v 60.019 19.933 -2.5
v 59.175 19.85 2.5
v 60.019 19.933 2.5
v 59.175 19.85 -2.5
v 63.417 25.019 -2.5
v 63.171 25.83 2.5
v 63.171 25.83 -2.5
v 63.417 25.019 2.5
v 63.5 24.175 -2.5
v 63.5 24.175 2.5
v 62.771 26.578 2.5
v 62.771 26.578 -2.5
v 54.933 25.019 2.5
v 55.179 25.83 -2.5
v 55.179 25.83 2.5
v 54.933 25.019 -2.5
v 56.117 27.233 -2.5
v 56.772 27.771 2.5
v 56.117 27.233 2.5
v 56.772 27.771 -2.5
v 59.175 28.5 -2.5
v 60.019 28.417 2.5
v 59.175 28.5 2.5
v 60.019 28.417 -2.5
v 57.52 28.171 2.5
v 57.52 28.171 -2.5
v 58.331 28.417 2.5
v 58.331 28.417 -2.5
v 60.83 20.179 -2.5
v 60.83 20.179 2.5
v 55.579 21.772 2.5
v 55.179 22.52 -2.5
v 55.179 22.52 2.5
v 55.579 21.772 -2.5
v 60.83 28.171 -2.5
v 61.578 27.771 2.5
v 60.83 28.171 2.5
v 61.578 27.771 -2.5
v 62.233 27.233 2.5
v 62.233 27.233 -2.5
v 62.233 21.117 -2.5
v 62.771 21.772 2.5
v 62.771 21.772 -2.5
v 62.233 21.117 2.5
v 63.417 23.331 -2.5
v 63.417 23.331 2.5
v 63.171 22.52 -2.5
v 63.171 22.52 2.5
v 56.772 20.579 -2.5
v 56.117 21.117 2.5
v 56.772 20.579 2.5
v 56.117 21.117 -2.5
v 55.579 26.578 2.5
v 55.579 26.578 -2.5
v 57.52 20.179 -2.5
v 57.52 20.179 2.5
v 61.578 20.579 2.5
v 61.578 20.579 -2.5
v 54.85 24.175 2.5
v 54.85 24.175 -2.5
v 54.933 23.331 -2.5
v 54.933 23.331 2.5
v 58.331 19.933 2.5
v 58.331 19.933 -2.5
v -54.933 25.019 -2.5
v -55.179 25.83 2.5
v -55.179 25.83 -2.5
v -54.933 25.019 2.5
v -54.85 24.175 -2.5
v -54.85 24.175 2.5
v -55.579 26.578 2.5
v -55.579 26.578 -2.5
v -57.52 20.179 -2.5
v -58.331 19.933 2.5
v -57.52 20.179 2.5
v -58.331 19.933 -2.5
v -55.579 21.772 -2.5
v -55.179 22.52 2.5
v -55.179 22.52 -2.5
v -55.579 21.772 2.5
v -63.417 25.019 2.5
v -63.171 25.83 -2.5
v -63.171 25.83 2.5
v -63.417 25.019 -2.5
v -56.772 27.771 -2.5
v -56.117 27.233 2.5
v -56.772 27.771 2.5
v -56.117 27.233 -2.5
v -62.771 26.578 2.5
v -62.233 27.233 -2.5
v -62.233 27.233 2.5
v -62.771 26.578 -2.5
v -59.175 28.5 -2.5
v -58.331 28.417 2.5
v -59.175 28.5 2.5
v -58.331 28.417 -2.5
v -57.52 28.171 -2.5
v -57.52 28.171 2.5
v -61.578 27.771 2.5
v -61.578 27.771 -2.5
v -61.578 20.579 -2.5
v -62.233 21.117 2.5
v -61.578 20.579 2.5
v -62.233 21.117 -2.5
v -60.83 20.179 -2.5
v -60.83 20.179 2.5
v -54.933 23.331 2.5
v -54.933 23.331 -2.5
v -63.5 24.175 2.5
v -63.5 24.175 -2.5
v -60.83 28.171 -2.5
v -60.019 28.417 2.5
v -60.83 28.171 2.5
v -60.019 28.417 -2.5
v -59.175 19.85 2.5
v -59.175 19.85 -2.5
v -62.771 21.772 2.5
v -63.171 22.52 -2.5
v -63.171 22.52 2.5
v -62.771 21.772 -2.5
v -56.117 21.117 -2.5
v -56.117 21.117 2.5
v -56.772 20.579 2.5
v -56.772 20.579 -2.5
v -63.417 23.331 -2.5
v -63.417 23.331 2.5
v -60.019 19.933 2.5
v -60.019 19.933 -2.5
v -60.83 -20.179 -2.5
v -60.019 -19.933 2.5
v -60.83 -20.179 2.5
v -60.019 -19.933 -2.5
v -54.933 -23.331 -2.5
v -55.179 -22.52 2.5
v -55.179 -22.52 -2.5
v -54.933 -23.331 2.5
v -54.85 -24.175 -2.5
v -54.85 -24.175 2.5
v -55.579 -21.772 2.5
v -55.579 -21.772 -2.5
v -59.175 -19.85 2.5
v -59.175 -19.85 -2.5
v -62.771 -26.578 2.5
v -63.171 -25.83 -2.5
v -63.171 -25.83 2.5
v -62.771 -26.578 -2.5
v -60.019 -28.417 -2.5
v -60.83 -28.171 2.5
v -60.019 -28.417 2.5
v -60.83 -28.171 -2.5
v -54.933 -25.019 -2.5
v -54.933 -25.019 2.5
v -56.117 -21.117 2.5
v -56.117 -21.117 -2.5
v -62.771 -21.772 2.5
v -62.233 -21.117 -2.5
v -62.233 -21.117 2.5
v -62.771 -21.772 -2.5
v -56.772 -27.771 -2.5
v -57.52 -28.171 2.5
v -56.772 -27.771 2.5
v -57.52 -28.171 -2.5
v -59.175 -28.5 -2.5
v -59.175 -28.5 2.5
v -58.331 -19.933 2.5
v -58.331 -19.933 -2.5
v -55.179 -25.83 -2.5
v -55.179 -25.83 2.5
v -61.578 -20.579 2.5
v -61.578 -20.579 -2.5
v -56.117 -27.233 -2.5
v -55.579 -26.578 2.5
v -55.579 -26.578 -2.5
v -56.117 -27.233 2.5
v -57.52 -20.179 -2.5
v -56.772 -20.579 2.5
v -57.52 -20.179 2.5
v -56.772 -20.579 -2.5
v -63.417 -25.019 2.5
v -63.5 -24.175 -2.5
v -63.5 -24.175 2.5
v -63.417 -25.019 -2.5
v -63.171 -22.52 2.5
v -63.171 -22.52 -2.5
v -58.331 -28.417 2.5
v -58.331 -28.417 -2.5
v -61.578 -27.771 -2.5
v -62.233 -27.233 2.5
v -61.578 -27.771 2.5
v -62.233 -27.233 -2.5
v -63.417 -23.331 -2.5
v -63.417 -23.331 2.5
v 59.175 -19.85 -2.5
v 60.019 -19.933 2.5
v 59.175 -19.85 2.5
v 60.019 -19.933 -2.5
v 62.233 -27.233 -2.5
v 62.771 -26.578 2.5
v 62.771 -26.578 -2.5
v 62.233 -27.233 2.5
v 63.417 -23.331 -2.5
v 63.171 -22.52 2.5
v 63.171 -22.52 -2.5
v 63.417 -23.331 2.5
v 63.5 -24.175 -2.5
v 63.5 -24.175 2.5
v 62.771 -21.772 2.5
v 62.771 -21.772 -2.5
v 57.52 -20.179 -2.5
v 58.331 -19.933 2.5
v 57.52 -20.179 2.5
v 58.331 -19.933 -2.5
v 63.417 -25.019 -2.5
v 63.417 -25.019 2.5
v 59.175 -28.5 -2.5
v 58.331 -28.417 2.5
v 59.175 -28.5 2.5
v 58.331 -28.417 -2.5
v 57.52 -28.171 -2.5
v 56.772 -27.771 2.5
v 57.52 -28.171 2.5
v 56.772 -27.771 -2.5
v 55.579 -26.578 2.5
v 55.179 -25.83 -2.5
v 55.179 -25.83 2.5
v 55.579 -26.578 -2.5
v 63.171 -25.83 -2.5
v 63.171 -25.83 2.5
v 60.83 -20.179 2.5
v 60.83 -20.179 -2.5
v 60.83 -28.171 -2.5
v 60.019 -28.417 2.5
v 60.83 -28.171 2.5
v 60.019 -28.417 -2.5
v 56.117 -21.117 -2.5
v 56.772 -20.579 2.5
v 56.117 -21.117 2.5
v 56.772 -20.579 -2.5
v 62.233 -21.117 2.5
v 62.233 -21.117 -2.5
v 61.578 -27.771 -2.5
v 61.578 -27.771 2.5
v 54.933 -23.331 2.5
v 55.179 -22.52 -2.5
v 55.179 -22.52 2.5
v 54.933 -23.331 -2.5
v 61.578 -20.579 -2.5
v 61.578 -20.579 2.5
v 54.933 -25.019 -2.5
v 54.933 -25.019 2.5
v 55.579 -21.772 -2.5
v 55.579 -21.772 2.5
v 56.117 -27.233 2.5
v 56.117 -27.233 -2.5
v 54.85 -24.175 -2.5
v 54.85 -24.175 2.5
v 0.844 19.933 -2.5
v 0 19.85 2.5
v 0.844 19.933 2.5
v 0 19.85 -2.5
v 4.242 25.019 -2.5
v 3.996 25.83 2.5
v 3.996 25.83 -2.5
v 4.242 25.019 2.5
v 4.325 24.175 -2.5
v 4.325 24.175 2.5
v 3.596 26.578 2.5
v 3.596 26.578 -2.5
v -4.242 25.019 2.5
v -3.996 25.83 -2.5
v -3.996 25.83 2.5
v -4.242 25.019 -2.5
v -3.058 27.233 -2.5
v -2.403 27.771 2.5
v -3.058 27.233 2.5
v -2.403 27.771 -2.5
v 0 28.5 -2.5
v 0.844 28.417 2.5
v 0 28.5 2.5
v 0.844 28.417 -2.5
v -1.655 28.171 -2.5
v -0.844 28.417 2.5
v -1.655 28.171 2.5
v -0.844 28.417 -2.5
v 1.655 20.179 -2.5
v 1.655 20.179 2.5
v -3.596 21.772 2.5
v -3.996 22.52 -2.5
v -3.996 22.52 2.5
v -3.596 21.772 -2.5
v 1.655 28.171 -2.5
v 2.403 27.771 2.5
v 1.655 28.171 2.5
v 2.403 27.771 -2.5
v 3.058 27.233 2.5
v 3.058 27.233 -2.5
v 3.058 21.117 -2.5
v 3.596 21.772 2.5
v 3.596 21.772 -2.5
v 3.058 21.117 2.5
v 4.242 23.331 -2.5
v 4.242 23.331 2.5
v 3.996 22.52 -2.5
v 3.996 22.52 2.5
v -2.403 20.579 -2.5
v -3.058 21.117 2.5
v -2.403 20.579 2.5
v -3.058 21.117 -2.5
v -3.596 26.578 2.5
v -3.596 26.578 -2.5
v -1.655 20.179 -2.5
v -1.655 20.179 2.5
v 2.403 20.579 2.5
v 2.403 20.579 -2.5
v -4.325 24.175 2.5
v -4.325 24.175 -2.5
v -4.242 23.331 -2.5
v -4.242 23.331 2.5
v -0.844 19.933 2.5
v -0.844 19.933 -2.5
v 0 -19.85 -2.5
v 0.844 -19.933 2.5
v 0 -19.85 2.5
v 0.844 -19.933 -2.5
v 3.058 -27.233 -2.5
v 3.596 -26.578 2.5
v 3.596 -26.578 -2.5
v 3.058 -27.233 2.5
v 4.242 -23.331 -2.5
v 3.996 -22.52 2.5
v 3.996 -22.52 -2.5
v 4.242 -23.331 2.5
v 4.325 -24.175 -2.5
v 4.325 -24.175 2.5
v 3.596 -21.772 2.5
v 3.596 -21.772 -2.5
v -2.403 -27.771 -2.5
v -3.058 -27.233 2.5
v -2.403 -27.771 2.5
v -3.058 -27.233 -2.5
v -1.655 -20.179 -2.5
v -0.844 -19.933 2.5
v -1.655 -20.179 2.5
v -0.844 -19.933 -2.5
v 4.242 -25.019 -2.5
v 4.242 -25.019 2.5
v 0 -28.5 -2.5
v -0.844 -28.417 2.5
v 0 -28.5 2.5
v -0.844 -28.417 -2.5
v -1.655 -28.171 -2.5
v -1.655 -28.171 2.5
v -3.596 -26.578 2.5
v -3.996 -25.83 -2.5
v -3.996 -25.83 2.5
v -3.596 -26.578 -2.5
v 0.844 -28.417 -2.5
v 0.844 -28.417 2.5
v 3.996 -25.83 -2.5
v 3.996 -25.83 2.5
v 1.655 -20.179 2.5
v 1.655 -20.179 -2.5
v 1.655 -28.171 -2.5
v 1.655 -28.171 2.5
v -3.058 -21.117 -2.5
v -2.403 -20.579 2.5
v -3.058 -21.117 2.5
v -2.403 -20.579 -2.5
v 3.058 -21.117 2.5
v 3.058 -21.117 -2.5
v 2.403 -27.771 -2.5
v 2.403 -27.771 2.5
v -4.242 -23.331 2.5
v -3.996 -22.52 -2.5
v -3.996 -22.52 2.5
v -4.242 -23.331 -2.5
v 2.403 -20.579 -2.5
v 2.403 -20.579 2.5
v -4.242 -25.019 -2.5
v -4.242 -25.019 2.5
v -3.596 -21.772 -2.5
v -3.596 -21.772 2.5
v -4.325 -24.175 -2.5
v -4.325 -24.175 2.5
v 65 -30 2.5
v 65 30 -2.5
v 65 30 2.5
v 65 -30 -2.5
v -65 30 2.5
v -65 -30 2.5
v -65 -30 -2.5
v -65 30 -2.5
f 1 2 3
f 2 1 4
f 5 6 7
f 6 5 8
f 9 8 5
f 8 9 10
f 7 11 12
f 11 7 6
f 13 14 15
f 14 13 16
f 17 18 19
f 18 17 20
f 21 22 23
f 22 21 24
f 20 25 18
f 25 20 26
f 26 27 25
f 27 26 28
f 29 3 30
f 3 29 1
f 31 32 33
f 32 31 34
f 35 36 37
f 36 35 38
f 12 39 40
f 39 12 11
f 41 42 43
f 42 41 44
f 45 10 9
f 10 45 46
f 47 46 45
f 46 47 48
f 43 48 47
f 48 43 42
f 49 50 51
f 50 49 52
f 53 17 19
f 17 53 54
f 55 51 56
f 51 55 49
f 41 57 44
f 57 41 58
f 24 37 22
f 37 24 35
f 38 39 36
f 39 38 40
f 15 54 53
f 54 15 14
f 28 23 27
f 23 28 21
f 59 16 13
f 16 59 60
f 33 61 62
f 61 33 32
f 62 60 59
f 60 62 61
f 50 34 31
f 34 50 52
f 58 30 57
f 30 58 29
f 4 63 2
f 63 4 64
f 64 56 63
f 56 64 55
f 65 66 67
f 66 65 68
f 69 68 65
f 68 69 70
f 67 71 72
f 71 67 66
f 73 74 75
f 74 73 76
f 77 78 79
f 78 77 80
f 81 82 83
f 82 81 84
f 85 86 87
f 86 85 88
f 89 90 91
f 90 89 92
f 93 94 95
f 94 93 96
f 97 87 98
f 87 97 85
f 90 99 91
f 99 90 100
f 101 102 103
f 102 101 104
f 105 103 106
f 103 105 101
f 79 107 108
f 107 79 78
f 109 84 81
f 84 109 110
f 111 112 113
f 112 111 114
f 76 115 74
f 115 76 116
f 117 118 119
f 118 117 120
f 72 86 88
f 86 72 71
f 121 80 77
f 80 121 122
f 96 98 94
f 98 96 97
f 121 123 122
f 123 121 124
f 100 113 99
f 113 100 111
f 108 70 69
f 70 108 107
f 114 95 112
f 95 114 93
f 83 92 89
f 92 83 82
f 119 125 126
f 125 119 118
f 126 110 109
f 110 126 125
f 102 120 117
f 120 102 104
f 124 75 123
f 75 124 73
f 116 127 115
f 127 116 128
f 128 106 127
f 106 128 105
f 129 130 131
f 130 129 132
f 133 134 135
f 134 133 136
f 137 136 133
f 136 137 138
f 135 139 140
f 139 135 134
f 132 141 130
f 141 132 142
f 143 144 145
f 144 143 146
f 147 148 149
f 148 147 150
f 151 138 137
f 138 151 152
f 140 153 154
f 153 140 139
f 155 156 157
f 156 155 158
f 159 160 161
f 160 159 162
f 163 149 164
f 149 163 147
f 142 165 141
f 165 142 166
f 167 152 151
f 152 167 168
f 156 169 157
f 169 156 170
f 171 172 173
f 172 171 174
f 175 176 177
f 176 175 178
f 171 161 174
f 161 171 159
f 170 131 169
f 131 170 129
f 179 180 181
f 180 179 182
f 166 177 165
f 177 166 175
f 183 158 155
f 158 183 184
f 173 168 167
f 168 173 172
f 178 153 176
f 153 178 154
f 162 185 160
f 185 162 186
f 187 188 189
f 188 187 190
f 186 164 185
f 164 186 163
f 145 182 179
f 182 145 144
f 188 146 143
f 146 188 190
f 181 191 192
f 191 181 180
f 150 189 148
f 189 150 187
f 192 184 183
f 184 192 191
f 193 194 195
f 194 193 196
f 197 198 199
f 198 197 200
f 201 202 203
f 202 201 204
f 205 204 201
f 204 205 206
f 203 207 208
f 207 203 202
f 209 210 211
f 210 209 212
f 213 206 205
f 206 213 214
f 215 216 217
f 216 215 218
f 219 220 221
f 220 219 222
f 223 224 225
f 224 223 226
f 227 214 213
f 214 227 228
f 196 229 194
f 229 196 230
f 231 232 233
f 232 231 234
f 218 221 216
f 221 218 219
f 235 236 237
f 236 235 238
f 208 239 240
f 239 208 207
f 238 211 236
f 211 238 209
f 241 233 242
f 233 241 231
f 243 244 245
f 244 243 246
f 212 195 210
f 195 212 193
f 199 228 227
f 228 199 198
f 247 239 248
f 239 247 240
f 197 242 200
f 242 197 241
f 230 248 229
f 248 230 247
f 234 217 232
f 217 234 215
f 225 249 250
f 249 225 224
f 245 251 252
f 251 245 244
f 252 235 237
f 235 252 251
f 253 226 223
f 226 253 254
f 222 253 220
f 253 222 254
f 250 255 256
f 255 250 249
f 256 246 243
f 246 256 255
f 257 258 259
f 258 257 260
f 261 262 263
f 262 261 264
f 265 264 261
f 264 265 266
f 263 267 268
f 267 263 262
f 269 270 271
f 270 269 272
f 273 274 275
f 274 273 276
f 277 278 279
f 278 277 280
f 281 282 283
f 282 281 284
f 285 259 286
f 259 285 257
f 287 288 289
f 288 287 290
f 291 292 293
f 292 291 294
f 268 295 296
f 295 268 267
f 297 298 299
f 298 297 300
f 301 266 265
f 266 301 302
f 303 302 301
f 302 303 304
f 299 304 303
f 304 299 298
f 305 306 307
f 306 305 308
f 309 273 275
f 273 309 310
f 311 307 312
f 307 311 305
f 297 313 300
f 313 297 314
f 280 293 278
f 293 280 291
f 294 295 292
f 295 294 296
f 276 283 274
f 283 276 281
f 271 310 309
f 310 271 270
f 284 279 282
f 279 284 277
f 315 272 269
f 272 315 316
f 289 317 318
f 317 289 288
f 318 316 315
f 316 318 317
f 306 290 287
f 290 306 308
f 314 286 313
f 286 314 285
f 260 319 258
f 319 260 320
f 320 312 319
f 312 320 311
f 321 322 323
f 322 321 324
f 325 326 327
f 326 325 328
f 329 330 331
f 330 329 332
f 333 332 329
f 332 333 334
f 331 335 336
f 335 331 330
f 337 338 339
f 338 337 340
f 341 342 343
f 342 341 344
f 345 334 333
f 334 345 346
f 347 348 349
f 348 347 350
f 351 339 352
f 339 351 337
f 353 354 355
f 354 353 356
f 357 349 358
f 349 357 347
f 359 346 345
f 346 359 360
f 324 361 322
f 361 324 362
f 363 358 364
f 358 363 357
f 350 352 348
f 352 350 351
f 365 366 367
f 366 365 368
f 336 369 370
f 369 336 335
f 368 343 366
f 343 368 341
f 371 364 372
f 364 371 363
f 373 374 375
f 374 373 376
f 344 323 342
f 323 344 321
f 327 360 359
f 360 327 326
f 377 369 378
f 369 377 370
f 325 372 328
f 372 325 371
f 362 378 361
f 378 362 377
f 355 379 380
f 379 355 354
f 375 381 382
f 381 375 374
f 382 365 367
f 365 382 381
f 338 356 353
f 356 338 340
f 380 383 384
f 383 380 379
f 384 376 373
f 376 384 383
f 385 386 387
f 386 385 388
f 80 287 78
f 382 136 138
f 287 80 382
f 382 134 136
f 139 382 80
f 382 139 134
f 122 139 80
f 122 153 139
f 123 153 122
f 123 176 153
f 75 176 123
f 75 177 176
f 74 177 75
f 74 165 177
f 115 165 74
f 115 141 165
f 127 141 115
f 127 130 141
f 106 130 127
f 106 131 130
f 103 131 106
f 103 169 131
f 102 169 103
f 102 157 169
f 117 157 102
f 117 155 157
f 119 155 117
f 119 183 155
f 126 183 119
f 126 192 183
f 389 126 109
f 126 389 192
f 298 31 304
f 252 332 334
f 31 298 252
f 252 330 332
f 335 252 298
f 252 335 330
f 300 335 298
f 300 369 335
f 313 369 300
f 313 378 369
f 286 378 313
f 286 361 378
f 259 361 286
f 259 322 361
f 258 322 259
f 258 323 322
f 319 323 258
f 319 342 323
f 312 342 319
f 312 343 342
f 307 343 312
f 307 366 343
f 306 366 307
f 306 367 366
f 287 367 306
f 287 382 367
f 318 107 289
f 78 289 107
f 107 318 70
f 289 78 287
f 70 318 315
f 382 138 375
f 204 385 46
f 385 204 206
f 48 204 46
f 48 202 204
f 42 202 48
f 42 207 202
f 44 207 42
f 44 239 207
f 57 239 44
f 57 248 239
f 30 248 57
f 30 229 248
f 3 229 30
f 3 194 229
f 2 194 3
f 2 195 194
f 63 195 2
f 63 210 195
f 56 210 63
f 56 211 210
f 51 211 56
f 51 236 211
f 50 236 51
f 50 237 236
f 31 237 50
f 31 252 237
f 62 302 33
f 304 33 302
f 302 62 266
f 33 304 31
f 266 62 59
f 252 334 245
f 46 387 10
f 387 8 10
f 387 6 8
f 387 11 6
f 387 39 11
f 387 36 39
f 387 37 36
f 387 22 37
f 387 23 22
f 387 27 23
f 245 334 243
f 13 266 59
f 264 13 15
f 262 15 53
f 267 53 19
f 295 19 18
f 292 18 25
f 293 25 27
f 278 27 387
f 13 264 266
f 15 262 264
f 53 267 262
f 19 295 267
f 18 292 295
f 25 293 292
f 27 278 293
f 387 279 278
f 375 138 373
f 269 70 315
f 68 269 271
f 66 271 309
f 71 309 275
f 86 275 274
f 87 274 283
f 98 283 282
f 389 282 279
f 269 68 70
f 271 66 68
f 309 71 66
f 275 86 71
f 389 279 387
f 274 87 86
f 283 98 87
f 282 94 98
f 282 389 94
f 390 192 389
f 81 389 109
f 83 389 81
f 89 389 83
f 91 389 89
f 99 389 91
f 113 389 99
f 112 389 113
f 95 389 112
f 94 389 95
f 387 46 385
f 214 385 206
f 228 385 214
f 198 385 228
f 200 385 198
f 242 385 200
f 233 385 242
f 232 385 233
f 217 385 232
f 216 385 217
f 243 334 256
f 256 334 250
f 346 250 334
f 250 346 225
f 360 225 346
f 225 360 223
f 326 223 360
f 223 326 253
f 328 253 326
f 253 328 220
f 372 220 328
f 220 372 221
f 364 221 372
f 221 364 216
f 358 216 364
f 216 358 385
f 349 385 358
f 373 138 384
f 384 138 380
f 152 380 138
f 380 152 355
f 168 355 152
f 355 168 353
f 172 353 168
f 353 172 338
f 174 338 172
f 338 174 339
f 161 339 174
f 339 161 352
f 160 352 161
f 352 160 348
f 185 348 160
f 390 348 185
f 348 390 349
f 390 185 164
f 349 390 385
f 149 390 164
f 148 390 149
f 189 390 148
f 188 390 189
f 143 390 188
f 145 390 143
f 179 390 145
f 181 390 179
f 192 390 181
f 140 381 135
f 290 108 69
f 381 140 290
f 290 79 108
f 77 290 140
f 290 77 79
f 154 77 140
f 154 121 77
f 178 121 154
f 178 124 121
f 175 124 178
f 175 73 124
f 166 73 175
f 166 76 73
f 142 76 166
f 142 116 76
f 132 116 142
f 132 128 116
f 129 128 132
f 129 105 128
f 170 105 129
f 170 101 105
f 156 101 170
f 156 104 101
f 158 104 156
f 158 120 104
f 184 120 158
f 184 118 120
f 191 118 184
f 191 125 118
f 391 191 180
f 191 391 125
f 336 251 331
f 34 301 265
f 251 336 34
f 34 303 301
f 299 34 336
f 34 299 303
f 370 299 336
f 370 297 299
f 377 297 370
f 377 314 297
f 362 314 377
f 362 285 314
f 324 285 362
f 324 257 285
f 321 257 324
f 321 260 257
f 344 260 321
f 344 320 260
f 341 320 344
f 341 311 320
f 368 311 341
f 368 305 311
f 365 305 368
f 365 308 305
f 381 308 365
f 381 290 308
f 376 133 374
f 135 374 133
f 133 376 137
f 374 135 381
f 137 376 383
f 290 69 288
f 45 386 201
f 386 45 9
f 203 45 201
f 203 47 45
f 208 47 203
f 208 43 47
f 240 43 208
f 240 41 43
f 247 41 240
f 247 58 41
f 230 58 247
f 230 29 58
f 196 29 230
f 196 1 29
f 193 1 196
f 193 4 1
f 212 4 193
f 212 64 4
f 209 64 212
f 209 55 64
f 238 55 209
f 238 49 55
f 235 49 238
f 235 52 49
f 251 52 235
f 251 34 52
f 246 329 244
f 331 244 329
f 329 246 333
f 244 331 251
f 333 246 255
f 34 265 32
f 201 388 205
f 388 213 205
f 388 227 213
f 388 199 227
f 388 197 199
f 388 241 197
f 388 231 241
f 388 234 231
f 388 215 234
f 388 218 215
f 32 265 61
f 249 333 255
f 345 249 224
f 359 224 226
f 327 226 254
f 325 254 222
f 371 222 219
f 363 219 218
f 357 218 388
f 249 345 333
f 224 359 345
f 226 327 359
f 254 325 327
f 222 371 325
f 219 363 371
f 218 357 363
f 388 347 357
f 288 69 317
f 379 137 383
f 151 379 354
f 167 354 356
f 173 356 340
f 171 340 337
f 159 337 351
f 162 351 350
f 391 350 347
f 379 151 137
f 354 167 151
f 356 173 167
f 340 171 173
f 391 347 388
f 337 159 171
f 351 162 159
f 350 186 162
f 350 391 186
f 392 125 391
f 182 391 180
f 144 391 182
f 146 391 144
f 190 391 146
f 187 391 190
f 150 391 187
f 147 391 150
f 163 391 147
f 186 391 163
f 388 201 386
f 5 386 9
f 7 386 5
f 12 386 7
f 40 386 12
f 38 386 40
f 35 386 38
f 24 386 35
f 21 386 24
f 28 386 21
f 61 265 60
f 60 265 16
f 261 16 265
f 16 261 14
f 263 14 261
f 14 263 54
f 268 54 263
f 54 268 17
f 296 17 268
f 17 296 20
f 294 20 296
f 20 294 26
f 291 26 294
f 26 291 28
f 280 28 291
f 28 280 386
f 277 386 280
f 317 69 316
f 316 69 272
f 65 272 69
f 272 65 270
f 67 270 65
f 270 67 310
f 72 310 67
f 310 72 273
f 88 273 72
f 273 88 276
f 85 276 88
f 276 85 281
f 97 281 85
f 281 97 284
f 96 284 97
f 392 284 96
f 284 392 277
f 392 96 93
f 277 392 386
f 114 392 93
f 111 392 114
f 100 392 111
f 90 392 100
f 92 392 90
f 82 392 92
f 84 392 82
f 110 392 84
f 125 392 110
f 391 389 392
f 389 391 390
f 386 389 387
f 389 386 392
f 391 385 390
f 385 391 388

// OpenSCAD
$fn = 32;

// ----------------------------------------------------------------------
// Corner plate 130 x 60 x 5
// 6 holes, centres taken from the edge offset
// ----------------------------------------------------------------------

// --- parameters (mm) ---
plate = [130, 60, 5];    // overall size (x, y, z)
holes = 6;               // number of holes the drawing asks for
bore_d = 8.4;            // nominal hole diameter from the drawing
print_allowance = 0.25;  // clearance added for printing
edge = 5.825;            // hole centre offset from the plate edge

// --- derived feature positions (mm) ---
hole_d = bore_d + print_allowance;  // = 8.65   hole diameter as printed
corner_x = plate[0] / 2 - edge;     // = 59.17   corner hole X
corner_y = plate[1] / 2 - edge;     // = 24.18   corner hole Y
feature_centers = [
  [corner_x, corner_y],
  [-corner_x, corner_y],
  [-corner_x, -corner_y],
  [corner_x, -corner_y],
  [0, corner_y],
  [0, -corner_y]
];   // hole centres the loop below drills

// plate outline, every hole drilled through with the same cutters
difference() {
  cube(plate, center = true);
  for (centre = feature_centers)
    translate([centre[0], centre[1], 0])
      cylinder(d = hole_d, h = plate[2] + 2, center = true);
}
